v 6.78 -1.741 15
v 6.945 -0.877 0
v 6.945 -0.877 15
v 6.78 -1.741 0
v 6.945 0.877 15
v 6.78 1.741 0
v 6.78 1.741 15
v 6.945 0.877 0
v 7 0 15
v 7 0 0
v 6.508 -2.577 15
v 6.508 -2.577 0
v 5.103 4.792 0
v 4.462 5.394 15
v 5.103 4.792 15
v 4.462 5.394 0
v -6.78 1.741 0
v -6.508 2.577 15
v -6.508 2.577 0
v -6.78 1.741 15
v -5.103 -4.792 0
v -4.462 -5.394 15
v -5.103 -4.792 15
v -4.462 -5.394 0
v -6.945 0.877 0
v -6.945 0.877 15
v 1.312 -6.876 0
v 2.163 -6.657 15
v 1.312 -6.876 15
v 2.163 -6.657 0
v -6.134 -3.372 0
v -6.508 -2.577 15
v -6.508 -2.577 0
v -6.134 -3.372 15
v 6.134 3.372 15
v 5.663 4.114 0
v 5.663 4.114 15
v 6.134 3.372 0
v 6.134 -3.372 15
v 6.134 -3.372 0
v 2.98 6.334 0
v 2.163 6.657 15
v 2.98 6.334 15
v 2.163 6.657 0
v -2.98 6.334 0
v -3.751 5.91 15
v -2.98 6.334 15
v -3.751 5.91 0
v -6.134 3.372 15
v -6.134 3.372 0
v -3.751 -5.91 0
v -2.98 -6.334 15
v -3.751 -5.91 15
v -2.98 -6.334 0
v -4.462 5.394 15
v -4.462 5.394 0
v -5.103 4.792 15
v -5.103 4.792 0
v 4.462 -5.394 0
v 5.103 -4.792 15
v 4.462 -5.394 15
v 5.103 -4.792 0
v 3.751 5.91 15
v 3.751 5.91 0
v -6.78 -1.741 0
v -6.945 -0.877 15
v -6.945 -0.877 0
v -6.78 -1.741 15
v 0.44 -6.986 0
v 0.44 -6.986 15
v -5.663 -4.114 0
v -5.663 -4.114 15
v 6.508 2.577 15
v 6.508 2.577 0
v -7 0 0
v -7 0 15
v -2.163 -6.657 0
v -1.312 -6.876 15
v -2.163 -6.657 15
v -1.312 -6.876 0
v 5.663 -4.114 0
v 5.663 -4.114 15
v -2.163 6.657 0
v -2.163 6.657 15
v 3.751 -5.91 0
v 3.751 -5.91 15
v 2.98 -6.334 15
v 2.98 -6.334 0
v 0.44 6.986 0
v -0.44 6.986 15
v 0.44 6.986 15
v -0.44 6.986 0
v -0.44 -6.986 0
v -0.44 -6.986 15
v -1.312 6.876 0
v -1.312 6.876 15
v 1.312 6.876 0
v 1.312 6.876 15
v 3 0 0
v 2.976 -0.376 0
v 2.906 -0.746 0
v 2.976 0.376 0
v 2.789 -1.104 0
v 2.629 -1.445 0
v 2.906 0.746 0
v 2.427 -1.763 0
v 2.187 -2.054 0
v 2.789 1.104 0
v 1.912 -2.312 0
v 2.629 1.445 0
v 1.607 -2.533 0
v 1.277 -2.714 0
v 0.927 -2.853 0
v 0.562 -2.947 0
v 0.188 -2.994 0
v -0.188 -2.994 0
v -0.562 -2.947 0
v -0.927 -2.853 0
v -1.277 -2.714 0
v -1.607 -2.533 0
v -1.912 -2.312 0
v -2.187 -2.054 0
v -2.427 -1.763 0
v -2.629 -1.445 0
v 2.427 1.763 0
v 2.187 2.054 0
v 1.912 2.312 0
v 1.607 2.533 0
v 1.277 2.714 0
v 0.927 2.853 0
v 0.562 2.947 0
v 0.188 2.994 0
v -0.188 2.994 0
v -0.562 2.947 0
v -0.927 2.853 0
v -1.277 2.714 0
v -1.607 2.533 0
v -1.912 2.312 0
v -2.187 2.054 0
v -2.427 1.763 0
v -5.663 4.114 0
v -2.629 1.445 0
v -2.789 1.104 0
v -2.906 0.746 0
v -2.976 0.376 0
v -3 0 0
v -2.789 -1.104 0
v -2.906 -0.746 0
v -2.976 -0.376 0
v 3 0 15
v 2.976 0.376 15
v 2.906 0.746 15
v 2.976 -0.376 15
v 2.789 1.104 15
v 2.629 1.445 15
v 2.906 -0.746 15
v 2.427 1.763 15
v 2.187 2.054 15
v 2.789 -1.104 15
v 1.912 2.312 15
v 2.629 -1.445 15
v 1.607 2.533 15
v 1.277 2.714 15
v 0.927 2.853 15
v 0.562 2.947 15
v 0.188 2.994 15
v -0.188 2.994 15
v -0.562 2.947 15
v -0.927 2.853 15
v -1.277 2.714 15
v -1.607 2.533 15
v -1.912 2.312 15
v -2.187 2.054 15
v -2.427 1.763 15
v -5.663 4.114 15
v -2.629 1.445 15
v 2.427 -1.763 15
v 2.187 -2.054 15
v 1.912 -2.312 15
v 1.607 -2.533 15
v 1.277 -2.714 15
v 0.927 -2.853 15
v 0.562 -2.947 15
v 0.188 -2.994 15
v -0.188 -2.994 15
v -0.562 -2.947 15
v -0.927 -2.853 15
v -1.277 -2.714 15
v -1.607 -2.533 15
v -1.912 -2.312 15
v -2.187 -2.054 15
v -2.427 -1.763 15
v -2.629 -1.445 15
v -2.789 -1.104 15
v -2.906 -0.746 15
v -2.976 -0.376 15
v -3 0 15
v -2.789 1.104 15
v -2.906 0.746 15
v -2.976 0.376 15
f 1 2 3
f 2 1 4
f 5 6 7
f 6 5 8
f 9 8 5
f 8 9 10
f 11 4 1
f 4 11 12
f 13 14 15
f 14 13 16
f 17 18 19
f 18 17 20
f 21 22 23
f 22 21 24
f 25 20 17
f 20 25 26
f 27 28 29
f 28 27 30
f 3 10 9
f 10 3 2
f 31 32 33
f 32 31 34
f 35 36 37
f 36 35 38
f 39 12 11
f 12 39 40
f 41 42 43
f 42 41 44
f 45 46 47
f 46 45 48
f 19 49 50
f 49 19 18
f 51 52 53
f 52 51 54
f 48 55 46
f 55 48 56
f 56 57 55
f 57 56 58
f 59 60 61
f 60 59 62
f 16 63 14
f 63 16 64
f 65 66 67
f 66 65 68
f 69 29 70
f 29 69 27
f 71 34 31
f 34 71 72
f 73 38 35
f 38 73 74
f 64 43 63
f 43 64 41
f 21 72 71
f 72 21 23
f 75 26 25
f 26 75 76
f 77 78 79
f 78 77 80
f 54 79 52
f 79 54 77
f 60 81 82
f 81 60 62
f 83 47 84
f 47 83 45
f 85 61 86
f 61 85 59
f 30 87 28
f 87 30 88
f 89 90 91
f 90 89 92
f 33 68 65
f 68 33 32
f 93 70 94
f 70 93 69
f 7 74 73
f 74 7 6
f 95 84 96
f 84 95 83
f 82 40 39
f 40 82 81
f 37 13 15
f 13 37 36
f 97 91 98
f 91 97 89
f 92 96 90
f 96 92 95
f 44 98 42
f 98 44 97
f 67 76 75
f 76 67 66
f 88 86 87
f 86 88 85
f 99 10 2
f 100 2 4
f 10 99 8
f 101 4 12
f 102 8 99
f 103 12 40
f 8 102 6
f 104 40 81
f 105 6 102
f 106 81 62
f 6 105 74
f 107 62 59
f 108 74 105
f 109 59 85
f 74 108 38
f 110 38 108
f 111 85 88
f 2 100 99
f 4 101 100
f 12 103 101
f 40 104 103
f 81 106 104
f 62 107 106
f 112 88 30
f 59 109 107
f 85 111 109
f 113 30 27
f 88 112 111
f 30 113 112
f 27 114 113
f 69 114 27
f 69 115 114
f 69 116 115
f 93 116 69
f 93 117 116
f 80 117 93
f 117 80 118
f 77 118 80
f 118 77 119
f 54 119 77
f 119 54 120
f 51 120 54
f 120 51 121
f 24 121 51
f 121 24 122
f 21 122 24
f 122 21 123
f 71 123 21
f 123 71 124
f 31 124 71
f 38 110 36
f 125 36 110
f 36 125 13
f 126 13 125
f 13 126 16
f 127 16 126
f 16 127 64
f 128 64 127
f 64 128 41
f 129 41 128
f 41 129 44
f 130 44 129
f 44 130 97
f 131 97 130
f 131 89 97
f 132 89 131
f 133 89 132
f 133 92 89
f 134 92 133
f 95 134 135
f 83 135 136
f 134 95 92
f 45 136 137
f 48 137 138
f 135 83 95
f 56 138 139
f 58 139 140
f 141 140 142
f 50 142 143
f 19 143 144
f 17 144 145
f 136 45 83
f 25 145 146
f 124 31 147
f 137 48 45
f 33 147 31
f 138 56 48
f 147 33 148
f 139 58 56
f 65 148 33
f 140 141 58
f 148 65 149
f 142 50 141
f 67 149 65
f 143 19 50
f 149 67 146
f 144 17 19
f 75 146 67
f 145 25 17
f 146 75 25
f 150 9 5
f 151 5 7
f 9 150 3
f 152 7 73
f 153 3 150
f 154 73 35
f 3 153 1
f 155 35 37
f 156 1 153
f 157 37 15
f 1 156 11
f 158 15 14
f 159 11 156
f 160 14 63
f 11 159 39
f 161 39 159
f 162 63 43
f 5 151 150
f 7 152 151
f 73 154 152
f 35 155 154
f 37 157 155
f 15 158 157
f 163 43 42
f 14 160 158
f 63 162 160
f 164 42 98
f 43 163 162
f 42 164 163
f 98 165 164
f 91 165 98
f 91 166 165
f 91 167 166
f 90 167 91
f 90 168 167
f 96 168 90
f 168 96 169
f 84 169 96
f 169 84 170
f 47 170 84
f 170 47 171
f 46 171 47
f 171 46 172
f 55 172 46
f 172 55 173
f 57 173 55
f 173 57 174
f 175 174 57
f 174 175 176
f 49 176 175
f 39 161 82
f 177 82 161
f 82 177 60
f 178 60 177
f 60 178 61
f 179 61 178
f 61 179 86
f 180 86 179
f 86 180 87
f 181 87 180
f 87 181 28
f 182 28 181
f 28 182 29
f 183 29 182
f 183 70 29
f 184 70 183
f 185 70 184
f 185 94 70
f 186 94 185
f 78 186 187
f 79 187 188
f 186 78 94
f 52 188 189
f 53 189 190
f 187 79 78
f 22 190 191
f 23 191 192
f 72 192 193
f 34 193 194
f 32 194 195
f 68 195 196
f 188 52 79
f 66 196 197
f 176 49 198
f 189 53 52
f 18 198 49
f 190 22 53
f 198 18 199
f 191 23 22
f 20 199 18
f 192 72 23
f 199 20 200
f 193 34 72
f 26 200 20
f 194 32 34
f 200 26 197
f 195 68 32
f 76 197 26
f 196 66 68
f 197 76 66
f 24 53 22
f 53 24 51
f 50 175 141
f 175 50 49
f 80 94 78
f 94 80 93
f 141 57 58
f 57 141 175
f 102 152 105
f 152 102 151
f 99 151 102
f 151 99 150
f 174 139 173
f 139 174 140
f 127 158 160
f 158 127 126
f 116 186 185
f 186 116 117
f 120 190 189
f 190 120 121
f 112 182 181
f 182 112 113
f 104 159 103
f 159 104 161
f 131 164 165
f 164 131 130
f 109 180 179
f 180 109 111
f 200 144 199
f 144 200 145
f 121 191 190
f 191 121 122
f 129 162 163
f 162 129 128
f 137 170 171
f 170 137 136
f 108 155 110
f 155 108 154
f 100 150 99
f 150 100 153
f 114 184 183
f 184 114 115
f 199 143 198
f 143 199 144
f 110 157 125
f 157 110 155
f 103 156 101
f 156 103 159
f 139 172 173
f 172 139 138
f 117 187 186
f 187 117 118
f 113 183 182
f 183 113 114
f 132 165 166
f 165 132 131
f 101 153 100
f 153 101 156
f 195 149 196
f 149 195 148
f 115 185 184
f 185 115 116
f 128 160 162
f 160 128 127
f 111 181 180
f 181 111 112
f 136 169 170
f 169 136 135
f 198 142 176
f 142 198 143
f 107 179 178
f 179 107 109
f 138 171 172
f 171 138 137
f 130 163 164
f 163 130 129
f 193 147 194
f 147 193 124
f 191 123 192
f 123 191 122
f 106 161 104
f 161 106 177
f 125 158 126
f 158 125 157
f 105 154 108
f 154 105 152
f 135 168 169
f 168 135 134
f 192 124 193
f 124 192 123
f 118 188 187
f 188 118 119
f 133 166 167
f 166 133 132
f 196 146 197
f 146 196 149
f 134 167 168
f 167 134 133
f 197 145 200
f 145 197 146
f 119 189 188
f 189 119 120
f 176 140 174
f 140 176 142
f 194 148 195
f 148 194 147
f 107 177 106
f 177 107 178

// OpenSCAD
$fn = 50;


difference() {
	union() {
		cylinder(h = 15, r = 7.0000000000);
	}
	union() {
		translate(v = [0, 0, -100]) {
			cylinder(h = 200, r = 3.0000000000);
		}
	}
}
